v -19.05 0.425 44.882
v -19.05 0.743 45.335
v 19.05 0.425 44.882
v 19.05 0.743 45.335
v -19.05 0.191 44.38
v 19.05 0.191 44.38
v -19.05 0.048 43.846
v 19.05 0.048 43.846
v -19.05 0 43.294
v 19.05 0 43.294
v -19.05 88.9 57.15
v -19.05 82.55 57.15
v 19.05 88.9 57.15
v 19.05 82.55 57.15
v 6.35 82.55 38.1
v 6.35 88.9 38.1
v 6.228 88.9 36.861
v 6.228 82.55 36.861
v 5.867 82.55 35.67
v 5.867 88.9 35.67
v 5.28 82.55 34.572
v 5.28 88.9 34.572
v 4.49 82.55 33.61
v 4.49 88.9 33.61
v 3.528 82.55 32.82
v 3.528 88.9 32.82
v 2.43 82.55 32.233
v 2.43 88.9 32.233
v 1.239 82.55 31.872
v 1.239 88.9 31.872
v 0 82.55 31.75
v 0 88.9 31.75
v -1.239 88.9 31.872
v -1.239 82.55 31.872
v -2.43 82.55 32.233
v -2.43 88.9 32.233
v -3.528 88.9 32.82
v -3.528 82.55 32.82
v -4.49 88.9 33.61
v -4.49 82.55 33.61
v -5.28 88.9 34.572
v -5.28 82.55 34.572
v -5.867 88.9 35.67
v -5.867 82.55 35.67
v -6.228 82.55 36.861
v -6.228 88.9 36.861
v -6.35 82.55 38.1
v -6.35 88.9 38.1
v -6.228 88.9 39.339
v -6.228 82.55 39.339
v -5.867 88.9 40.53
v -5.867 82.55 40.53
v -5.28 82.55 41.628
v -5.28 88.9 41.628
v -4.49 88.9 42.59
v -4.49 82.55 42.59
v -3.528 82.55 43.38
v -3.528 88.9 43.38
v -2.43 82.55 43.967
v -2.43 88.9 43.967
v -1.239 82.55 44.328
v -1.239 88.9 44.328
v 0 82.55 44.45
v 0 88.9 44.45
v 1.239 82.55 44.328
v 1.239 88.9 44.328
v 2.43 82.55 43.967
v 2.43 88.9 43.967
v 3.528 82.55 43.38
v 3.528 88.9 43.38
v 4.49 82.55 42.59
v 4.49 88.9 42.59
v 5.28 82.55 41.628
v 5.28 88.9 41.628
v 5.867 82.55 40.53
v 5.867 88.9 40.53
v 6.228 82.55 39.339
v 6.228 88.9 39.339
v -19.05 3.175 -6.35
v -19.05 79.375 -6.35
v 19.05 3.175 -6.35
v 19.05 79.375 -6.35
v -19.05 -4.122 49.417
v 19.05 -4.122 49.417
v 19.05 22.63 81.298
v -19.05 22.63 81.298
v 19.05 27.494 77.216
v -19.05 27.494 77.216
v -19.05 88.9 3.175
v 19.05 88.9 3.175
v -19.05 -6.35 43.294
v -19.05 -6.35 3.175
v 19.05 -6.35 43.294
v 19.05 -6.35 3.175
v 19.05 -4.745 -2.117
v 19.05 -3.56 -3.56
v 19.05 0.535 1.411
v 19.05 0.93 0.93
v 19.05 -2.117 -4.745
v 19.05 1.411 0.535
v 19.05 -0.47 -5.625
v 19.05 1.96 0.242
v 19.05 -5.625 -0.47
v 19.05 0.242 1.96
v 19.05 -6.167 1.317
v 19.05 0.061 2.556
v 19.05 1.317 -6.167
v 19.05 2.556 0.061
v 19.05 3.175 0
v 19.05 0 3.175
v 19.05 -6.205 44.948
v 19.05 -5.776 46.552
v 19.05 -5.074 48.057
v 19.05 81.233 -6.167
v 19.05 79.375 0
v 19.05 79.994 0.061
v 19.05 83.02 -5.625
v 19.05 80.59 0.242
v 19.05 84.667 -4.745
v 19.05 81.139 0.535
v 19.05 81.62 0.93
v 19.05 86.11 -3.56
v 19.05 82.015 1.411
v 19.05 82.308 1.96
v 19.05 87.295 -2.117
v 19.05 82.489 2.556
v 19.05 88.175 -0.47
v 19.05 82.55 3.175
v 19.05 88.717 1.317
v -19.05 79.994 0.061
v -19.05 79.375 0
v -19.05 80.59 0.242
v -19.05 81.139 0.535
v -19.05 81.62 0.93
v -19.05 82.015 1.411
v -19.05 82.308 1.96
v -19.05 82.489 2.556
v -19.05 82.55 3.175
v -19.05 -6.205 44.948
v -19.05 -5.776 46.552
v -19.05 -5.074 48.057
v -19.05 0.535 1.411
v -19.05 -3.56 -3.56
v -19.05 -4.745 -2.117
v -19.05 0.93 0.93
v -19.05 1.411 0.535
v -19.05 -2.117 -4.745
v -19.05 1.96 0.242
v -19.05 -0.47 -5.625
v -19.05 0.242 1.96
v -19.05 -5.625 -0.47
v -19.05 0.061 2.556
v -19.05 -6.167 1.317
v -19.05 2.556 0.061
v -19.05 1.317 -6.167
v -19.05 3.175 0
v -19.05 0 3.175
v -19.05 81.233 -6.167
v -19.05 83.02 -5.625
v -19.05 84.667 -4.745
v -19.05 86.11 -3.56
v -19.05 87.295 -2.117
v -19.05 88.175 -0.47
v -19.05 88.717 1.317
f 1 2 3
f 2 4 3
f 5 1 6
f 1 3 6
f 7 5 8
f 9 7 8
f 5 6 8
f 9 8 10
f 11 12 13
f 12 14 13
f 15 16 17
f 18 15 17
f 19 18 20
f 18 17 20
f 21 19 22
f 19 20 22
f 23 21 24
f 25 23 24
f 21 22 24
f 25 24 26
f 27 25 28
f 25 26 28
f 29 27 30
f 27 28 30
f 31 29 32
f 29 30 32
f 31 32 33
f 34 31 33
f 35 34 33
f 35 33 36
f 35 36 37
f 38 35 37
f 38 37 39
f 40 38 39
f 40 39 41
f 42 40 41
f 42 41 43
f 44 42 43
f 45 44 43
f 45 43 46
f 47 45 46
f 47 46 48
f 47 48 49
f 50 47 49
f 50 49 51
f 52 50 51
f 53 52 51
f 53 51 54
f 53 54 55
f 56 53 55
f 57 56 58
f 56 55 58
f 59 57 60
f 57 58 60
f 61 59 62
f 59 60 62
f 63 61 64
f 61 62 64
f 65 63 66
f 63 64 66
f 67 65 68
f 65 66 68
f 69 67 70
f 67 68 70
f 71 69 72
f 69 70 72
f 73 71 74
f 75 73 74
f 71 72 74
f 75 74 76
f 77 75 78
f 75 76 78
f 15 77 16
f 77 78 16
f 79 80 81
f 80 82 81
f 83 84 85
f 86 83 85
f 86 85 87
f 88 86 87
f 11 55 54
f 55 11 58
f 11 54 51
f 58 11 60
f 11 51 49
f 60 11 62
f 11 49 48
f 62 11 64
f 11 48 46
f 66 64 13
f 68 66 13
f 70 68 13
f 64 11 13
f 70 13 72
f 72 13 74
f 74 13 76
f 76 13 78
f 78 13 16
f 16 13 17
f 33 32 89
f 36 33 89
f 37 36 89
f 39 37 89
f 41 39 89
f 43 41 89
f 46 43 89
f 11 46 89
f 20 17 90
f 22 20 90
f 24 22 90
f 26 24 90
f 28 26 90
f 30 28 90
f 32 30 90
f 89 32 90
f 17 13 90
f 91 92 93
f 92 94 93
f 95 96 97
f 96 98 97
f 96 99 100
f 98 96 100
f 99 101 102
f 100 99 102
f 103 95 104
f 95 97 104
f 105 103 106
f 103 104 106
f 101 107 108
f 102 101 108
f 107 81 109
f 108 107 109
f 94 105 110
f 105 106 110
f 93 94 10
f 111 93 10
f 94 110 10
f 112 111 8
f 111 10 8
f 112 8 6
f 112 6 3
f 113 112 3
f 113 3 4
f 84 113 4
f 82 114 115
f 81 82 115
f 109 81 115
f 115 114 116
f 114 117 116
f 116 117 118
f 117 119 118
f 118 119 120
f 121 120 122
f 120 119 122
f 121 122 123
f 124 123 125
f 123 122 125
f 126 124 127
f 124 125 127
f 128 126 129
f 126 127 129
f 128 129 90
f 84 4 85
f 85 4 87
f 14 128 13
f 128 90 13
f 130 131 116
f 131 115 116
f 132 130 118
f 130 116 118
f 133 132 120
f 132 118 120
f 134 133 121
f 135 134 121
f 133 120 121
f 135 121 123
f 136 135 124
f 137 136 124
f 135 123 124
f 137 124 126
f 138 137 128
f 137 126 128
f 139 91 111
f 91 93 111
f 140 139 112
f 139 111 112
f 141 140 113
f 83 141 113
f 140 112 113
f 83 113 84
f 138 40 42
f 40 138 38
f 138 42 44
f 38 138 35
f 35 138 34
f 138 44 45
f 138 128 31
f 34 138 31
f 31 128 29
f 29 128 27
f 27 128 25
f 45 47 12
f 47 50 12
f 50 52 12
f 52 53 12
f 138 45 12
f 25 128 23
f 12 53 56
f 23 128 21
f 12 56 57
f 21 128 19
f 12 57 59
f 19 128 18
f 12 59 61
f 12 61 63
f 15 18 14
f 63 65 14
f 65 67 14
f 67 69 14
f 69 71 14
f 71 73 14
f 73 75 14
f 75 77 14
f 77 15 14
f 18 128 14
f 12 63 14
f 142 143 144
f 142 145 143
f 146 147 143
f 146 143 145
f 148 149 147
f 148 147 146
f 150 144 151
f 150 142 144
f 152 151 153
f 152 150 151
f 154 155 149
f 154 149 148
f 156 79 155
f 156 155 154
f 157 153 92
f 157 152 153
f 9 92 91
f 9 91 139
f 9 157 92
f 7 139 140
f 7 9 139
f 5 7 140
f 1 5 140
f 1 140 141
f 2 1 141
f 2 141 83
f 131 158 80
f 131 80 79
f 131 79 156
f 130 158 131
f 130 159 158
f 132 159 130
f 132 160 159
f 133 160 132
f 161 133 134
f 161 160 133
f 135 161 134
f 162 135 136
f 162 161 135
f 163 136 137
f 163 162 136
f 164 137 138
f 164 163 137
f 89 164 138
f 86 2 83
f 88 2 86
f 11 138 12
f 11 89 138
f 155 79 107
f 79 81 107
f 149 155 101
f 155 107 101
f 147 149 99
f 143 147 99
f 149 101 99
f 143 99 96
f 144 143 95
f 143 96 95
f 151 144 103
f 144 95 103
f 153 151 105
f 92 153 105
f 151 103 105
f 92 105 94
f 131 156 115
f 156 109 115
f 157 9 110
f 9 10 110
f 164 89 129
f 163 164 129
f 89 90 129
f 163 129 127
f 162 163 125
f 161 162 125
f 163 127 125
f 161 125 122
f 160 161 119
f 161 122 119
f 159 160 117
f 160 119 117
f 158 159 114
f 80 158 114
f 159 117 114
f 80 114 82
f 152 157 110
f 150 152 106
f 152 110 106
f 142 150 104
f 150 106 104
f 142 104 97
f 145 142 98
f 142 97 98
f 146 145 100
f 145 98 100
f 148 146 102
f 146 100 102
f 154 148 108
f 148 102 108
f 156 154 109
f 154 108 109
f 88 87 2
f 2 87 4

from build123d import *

# Parameters (mm, degrees)
EXTRUDE_THIN1_DEPTH = 19.05
CUT_EXTRUDE1_REACH  = 97.25
SKETCH2_R           = 6.35


with BuildPart() as part:
    # Sketch1 → Extrude-Thin1 (new body, symmetric)
    with BuildSketch(Plane(origin=(0, 0, 0), x_dir=(0, 0, -1), z_dir=(1, 0, 0))):
        with BuildLine():
            Line((-77.216478592, 27.494340102), (-45.335245167, 0.742808893))
            ThreePointArc((-45.335245167, 0.742808893), (-44.380308461, 0.191475929), (-43.294394506, 0))
            Line((-43.294394506, 0), (-3.175, 0))
            ThreePointArc((-3.175, 0), (-0.92993597, 0.92993597), (0, 3.175))
            Line((0, 3.175), (0, 79.375))
            ThreePointArc((0, 79.375), (-0.92993597, 81.62006403), (-3.175, 82.55))
            Line((-3.175, 82.55), (-57.15, 82.55))
            Line((-57.15, 82.55), (-57.15, 88.9))
            Line((-57.15, 88.9), (-3.175, 88.9))
            ThreePointArc((-3.175, 88.9), (3.560192091, 86.110192091), (6.35, 79.375))
            Line((6.35, 79.375), (6.35, 3.175))
            ThreePointArc((6.35, 3.175), (3.560192091, -3.560192091), (-3.175, -6.35))
            Line((-3.175, -6.35), (-43.294394506, -6.35))
            ThreePointArc((-43.294394506, -6.35), (-46.552136371, -5.775572213), (-49.416946488, -4.121573321))
            Line((-49.416946488, -4.121573321), (-81.298179914, 22.629957888))
            Line((-81.298179914, 22.629957888), (-77.216478592, 27.494340102))
        make_face()
    extrude(amount=EXTRUDE_THIN1_DEPTH, both=True)

    # Sketch2 → Cut-Extrude1 (cut, up to next)
    with BuildSketch(Plane(origin=(0, 88.9, 0), x_dir=(1, 0, 0), z_dir=(0, 1, 0)), mode=Mode.PRIVATE) as cut_extrude1_sk1:
        with Locations((0, -38.1)):
            Circle(SKETCH2_R)
    cut_extrude1_tool1 = extrude(cut_extrude1_sk1.sketch, amount=-CUT_EXTRUDE1_REACH, mode=Mode.PRIVATE) & part.part
    add(cut_extrude1_tool1.solids().sort_by_distance((0, 88.9, 38.1))[0], mode=Mode.SUBTRACT)


solid = part.part
